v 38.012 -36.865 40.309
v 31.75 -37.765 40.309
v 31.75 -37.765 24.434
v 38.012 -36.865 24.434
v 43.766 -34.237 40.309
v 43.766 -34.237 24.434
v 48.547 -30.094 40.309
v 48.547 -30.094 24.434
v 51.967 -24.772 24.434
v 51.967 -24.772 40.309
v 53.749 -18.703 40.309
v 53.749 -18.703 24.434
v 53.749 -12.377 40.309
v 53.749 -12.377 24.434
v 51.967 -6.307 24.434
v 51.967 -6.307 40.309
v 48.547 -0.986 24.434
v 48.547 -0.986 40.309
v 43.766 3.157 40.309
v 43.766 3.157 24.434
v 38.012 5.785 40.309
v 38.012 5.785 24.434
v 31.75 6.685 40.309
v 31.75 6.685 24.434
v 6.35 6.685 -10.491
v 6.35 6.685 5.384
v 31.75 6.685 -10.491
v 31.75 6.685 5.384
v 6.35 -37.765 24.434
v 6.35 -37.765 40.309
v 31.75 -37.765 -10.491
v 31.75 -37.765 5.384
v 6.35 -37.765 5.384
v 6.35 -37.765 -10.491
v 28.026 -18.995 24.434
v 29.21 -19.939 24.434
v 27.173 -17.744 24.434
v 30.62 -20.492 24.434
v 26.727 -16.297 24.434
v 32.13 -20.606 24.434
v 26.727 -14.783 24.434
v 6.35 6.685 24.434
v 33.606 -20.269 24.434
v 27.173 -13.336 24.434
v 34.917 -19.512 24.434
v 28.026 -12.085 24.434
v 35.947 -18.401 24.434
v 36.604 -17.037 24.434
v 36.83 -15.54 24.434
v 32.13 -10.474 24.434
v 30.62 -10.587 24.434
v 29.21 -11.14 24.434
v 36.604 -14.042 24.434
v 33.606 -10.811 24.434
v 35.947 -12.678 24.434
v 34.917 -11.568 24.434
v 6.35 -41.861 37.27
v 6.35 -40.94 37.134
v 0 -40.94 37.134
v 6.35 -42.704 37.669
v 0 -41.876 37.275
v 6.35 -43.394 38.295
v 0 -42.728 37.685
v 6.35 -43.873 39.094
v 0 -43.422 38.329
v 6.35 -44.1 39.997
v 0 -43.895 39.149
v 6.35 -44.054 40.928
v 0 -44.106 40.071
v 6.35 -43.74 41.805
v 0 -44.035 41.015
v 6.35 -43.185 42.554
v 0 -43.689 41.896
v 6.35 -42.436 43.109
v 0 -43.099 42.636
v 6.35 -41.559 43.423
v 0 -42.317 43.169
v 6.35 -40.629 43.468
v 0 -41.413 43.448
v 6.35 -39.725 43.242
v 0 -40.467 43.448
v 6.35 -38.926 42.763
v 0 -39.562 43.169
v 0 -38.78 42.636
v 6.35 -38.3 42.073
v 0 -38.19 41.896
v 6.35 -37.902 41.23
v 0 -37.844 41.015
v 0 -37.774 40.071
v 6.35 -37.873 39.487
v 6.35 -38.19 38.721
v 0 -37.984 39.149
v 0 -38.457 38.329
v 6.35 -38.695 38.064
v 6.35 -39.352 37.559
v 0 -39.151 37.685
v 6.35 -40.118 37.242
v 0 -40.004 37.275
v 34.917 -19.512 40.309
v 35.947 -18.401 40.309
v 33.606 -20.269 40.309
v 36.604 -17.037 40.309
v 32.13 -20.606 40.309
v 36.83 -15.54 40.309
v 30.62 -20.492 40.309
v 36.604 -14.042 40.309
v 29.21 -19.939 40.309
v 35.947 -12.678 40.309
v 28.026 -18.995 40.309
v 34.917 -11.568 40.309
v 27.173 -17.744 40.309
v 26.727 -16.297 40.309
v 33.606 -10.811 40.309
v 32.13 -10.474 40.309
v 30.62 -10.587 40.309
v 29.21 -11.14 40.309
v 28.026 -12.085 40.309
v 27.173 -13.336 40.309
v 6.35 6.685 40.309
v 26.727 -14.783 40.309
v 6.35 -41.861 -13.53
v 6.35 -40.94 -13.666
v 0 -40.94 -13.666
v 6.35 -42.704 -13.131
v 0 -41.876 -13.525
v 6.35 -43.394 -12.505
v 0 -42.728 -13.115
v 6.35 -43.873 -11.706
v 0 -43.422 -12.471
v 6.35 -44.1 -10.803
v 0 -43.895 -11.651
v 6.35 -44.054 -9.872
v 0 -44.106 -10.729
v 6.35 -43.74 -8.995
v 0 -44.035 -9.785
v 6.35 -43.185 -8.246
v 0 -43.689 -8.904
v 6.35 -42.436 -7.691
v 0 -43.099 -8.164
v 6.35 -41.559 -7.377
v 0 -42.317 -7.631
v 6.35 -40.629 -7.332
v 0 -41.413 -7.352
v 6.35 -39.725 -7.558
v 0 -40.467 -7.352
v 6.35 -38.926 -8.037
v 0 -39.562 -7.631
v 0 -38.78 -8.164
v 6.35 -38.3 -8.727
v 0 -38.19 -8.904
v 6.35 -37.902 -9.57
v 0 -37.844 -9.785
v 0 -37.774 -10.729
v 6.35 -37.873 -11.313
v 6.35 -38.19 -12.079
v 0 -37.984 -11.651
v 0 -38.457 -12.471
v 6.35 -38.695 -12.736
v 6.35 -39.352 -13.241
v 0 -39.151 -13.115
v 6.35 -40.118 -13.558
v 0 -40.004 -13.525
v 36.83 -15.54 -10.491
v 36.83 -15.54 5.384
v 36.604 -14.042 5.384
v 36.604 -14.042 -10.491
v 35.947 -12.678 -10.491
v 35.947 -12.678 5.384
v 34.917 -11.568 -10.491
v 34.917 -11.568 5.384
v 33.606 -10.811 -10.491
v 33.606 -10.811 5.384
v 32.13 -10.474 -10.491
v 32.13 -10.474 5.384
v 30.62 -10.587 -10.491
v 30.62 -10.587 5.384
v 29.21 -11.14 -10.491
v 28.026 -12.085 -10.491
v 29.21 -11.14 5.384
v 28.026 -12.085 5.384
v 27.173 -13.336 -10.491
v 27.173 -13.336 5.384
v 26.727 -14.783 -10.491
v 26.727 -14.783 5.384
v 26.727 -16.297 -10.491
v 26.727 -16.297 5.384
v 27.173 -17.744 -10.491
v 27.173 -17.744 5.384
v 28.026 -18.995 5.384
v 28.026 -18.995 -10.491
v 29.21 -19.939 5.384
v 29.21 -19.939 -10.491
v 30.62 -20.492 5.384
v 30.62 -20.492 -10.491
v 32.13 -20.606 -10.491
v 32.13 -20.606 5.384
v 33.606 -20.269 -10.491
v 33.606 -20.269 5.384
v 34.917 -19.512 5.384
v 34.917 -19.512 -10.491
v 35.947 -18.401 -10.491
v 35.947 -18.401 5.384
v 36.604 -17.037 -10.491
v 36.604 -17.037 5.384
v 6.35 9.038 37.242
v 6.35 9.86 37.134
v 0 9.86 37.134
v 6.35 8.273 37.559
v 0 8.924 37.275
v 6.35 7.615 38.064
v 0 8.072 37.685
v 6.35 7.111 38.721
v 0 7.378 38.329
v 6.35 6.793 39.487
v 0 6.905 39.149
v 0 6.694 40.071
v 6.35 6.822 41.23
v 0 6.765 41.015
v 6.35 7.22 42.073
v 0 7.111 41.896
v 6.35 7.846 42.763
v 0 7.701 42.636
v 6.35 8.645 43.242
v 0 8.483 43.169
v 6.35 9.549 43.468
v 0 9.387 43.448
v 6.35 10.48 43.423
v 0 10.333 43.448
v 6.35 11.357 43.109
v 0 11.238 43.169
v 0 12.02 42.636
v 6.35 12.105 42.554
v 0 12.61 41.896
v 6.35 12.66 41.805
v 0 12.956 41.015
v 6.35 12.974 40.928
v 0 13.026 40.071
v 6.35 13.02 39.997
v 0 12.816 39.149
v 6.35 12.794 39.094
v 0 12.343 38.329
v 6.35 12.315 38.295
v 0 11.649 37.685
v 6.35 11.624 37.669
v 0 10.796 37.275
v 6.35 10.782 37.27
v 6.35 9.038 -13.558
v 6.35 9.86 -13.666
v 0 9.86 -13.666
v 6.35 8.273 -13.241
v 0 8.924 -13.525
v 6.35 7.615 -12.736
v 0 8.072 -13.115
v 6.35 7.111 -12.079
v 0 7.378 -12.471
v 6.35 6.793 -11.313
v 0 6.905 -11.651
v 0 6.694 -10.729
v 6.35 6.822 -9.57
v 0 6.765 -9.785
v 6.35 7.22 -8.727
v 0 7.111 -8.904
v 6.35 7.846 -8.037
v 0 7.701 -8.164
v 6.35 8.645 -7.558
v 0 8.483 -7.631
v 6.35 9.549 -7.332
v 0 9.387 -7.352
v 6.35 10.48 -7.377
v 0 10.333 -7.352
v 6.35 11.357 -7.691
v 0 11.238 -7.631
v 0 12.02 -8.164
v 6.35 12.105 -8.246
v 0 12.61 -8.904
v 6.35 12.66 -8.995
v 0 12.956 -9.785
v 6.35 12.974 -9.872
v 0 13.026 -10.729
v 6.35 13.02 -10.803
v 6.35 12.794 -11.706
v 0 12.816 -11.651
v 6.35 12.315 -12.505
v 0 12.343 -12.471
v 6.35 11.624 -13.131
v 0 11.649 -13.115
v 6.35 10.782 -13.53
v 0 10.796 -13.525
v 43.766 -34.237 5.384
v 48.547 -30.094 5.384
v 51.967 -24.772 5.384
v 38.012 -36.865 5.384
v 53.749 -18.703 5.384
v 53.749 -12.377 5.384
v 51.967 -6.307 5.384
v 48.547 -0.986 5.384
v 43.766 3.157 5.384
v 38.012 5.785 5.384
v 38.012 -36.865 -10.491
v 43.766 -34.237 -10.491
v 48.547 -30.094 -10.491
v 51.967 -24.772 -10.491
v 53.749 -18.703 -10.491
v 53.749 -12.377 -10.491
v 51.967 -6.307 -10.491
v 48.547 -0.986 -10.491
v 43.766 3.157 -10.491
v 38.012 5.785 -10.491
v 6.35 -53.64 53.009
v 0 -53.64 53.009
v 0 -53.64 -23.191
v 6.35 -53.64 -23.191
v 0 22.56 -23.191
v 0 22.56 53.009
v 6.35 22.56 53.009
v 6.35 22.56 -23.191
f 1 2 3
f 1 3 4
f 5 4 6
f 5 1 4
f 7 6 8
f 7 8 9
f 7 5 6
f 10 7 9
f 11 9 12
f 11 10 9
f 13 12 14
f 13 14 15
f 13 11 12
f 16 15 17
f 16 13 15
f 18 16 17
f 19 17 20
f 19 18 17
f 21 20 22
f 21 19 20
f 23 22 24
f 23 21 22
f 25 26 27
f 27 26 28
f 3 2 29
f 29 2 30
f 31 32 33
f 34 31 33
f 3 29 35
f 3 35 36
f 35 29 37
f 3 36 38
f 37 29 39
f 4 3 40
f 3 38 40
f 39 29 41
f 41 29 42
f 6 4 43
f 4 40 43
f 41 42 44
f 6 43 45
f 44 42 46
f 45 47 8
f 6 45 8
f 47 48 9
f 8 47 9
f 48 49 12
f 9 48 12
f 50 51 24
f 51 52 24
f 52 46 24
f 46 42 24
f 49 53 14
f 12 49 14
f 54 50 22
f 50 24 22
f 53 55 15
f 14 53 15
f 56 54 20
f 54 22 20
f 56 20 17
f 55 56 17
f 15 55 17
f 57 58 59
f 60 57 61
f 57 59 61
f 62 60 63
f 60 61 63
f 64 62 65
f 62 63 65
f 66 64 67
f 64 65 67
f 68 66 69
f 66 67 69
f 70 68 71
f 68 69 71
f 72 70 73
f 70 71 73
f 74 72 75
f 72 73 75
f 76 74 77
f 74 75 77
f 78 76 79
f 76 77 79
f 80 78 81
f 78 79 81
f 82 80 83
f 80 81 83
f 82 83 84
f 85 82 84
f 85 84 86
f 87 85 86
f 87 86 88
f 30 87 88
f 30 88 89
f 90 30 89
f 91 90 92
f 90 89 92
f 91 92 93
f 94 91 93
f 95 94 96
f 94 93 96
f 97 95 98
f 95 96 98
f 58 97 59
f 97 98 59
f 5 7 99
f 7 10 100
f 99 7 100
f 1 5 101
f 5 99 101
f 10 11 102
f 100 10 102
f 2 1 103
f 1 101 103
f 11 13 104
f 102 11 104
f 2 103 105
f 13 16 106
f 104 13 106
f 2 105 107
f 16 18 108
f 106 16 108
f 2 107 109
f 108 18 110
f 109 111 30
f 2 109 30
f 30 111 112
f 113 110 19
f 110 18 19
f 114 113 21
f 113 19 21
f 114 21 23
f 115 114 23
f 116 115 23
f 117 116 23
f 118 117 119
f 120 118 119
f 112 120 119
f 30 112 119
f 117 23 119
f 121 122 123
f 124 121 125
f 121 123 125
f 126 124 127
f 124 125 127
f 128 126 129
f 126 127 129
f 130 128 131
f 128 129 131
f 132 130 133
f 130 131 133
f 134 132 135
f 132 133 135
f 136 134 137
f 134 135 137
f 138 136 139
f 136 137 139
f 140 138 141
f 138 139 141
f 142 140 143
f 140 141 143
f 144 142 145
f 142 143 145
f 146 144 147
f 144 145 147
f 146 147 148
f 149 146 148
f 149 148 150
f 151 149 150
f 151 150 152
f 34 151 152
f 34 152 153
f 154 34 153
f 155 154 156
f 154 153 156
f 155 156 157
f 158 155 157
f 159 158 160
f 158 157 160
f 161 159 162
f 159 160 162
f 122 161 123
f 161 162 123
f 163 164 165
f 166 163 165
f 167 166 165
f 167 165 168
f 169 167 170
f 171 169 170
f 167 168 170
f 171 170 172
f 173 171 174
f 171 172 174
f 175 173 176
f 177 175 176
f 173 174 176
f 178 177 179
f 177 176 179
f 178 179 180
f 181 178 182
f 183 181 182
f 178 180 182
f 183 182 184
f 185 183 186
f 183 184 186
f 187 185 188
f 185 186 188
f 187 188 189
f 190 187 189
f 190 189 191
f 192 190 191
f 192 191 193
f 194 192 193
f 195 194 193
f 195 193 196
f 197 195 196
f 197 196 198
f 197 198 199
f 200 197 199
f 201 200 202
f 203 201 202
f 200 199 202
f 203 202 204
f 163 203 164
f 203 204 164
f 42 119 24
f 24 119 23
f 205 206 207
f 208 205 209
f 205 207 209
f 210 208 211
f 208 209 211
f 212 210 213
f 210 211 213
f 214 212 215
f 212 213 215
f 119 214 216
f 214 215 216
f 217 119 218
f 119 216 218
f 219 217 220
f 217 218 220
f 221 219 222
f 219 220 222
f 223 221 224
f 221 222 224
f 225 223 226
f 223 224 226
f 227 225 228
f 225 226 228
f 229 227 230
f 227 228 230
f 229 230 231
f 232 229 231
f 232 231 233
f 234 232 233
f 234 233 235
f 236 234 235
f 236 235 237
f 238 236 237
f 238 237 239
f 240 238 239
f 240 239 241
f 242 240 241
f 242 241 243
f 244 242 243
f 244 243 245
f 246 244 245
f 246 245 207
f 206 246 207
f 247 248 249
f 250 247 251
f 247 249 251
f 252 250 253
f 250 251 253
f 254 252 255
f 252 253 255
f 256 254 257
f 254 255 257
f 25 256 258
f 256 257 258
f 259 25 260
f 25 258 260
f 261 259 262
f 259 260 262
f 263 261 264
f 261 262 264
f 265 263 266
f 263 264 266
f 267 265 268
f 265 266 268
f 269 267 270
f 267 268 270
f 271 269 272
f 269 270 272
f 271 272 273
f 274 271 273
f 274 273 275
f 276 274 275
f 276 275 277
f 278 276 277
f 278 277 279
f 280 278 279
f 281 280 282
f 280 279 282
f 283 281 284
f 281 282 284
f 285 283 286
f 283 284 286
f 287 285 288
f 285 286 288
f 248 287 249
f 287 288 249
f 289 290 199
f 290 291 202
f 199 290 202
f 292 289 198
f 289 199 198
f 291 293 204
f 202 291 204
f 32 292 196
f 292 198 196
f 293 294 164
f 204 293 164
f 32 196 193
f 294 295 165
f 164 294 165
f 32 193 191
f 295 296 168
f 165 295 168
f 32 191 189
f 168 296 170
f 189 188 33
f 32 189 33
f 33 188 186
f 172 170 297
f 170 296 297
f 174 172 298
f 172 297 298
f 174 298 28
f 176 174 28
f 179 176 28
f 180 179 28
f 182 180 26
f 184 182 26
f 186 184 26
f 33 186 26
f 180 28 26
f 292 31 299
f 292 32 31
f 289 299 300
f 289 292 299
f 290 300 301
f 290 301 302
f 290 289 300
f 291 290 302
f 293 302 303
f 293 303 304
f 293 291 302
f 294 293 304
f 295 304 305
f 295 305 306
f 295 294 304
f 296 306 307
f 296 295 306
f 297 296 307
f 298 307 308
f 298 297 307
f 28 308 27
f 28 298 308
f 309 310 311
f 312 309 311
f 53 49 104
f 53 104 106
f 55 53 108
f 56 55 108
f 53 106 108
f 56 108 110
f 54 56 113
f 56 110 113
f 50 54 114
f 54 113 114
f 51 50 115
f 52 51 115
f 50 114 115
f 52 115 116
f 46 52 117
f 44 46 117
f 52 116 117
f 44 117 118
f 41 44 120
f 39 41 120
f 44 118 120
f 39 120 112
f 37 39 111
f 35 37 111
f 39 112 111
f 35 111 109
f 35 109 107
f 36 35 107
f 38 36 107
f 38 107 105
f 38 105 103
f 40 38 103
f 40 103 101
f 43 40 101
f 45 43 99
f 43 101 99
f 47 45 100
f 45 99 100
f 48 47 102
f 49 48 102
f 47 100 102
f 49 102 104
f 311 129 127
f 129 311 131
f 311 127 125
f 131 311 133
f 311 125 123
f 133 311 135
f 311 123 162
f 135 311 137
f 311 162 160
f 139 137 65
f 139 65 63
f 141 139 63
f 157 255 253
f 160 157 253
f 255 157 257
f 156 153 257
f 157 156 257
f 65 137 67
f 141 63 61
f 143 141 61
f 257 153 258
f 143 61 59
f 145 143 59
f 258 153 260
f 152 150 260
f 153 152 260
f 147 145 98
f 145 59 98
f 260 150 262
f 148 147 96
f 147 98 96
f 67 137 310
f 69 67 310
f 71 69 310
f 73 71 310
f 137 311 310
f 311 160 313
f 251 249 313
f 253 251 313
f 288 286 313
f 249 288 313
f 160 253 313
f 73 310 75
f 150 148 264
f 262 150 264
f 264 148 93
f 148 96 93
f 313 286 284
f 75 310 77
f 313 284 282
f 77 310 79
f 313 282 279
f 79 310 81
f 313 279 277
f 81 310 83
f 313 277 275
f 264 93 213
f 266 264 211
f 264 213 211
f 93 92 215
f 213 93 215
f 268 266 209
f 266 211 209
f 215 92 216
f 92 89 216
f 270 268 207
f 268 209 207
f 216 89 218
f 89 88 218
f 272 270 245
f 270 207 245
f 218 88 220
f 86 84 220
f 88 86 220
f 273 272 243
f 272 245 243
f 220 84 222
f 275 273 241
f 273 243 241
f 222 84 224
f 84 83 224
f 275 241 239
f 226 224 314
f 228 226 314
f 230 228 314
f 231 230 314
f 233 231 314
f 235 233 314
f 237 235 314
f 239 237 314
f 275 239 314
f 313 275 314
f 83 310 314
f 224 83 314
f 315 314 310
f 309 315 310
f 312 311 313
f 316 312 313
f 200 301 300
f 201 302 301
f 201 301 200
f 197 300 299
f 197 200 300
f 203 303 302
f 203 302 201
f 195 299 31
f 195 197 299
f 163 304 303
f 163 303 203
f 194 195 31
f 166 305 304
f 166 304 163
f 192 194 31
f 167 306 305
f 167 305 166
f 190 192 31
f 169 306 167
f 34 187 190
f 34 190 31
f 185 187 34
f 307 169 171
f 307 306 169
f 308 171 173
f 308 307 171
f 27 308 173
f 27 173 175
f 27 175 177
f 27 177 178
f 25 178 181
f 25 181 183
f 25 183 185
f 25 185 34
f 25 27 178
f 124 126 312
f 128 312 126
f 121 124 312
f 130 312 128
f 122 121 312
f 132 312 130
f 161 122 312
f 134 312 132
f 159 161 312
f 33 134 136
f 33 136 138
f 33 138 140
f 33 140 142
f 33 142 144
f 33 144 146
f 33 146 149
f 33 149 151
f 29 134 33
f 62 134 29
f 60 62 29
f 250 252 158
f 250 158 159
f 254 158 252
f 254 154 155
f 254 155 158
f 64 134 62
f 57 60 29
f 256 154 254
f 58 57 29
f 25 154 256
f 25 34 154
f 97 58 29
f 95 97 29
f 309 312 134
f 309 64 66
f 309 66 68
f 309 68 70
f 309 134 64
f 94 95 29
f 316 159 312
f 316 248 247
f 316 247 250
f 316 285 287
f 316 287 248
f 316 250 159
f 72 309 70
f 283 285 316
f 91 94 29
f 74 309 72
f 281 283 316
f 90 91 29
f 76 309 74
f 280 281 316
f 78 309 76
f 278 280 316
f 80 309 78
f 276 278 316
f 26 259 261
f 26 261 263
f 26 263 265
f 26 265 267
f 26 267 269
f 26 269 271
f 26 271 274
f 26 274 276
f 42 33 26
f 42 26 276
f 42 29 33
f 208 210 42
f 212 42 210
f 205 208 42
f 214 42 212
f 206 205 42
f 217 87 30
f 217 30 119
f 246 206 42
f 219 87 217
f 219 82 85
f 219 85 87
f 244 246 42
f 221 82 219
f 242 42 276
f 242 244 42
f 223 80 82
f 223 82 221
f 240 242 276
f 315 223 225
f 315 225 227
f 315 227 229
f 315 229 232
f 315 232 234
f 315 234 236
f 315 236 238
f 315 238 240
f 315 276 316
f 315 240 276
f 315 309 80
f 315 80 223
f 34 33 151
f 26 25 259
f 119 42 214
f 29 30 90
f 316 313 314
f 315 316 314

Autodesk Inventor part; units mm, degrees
ref_plane "YZ Plane" through (0, 0, 0) normal (1, 0, 0) x (0, 1, 0)
ref_plane "XZ Plane" through (0, 0, 0) normal (0, 1, 0) x (-1, 0, 0)
ref_plane "XY Plane" through (0, 0, 0) normal (0, 0, 1) x (1, 0, 0)
sketch "Sketch1" plane through (0, 0, 0) normal (1, 0, 0) x (0, 1, 0)
  line L0 (22.5602, 53.0087) -> (-53.6398, 53.0087)
  line L1 (-53.6398, 53.0087) -> (-53.6398, -23.1913)
  line L2 (-53.6398, -23.1913) -> (22.5602, -23.1913)
  line L3 (22.5602, -23.1913) -> (22.5602, 53.0087)
  point P0 (0, 0)
  dimension "d0" = 76.2
  dimension "d1" = 76.2
extrude "Extrusion1" add sketch "Sketch1" along normal blind 6.35
sketch "Sketch2" plane through (6.35, 0, 0) normal (1, 0, 0) x (0, 0, -1)
  line L0 (23.1913, 22.5602) -> (-53.0087, 22.5602) projected
  line L1 (-53.0087, 22.5602) -> (-53.0087, -53.6398) projected
  line L2 (23.1913, -53.6398) -> (23.1913, 22.5602) projected
  line L3 (-53.0087, -53.6398) -> (23.1913, -53.6398) projected
  point P0 (0, 0)
  point P1 (-40.3087, 9.8602)
  point P2 (10.4913, 9.8602)
  point P3 (-40.3087, -40.9398)
  point P4 (10.4913, -40.9398)
  dimension "d4" = 12.7
  dimension "d5" = 12.7
  dimension "d6" = 12.7
  dimension "d7" = 12.7
  dimension "d8" = 12.7
  dimension "d9" = 12.7
  dimension "d10" = 12.7
  dimension "d11" = 12.7
hole "Hole1" at (6.35, 9.8602, 40.3087) at (6.35, 9.8602, -10.4913) at (6.35, -40.9398, 40.3087) at (6.35, -40.9398, -10.4913) direction (-1, 0, 0) diameter 6.35 end through all
sketch "Sketch3" plane through (0, -53.6398, 53.0087) normal (0, 0, 1) x (1, 0, 0)
  line L0 (6.35, 76.2) -> (6.35, 0) projected
  line L1 (6.35, 60.325) -> (31.75, 60.325)
  line L2 (31.75, 60.325) -> (31.75, 15.875)
  line L3 (31.75, 15.875) -> (6.35, 15.875)
  line L4 (6.35, 15.875) -> (6.35, 60.325)
  line L5 (0, 76.2) -> (6.35, 76.2) projected
  arc A0 (31.75, 15.875) -> (31.75, 60.325) centre (31.75, 38.1) ccw
  circle A1 centre (31.75, 38.1) radius 5.08
  point P0 (0, 53.6398)
  point P1 (6.35, 15.875)
  dimension "d19" = 25.4
  dimension "d20" = 44.45
  dimension "d21" = 15.875
  dimension "d22" = 10.16
extrude "Extrusion2" add sketch "Sketch3" against normal blind 76.2 contours L1 L2 A1 L3 L0 | A0 L2 A1
sketch "Sketch4" plane through (6.35, 6.6852, 53.0087) normal (0, 1, 0) x (1, 0, 0)
  line L0 (25.4, 0) -> (0, 0) projected
  line L1 (0, 0) -> (74.1036, 0)
  line L2 (74.1036, 0) -> (74.1036, 12.7)
  line L3 (74.1036, 12.7) -> (0, 12.7)
  line L4 (0, 12.7) -> (0, 0)
  line L5 (-6.35, 76.2) -> (0, 76.2) projected
  line L6 (0, 76.2) -> (74.1036, 76.2)
  line L7 (74.1036, 76.2) -> (74.1036, 63.5)
  line L8 (74.1036, 63.5) -> (0, 63.5)
  line L9 (0, 63.5) -> (0, 76.2)
  line L10 (0, 28.575) -> (74.1036, 28.575)
  line L11 (74.1036, 28.575) -> (74.1036, 47.625)
  line L12 (74.1036, 47.625) -> (0, 47.625)
  line L13 (0, 47.625) -> (0, 28.575)
  point P0 (-6.35, 53.0087)
  dimension "d25" = 12.7
  dimension "d26" = 12.7
  dimension "d27" = 19.05
  dimension "d28" = 15.875
extrude "Extrusion3" cut sketch "Sketch4" against normal blind 76.2
properties part number "Undercarriage load"
